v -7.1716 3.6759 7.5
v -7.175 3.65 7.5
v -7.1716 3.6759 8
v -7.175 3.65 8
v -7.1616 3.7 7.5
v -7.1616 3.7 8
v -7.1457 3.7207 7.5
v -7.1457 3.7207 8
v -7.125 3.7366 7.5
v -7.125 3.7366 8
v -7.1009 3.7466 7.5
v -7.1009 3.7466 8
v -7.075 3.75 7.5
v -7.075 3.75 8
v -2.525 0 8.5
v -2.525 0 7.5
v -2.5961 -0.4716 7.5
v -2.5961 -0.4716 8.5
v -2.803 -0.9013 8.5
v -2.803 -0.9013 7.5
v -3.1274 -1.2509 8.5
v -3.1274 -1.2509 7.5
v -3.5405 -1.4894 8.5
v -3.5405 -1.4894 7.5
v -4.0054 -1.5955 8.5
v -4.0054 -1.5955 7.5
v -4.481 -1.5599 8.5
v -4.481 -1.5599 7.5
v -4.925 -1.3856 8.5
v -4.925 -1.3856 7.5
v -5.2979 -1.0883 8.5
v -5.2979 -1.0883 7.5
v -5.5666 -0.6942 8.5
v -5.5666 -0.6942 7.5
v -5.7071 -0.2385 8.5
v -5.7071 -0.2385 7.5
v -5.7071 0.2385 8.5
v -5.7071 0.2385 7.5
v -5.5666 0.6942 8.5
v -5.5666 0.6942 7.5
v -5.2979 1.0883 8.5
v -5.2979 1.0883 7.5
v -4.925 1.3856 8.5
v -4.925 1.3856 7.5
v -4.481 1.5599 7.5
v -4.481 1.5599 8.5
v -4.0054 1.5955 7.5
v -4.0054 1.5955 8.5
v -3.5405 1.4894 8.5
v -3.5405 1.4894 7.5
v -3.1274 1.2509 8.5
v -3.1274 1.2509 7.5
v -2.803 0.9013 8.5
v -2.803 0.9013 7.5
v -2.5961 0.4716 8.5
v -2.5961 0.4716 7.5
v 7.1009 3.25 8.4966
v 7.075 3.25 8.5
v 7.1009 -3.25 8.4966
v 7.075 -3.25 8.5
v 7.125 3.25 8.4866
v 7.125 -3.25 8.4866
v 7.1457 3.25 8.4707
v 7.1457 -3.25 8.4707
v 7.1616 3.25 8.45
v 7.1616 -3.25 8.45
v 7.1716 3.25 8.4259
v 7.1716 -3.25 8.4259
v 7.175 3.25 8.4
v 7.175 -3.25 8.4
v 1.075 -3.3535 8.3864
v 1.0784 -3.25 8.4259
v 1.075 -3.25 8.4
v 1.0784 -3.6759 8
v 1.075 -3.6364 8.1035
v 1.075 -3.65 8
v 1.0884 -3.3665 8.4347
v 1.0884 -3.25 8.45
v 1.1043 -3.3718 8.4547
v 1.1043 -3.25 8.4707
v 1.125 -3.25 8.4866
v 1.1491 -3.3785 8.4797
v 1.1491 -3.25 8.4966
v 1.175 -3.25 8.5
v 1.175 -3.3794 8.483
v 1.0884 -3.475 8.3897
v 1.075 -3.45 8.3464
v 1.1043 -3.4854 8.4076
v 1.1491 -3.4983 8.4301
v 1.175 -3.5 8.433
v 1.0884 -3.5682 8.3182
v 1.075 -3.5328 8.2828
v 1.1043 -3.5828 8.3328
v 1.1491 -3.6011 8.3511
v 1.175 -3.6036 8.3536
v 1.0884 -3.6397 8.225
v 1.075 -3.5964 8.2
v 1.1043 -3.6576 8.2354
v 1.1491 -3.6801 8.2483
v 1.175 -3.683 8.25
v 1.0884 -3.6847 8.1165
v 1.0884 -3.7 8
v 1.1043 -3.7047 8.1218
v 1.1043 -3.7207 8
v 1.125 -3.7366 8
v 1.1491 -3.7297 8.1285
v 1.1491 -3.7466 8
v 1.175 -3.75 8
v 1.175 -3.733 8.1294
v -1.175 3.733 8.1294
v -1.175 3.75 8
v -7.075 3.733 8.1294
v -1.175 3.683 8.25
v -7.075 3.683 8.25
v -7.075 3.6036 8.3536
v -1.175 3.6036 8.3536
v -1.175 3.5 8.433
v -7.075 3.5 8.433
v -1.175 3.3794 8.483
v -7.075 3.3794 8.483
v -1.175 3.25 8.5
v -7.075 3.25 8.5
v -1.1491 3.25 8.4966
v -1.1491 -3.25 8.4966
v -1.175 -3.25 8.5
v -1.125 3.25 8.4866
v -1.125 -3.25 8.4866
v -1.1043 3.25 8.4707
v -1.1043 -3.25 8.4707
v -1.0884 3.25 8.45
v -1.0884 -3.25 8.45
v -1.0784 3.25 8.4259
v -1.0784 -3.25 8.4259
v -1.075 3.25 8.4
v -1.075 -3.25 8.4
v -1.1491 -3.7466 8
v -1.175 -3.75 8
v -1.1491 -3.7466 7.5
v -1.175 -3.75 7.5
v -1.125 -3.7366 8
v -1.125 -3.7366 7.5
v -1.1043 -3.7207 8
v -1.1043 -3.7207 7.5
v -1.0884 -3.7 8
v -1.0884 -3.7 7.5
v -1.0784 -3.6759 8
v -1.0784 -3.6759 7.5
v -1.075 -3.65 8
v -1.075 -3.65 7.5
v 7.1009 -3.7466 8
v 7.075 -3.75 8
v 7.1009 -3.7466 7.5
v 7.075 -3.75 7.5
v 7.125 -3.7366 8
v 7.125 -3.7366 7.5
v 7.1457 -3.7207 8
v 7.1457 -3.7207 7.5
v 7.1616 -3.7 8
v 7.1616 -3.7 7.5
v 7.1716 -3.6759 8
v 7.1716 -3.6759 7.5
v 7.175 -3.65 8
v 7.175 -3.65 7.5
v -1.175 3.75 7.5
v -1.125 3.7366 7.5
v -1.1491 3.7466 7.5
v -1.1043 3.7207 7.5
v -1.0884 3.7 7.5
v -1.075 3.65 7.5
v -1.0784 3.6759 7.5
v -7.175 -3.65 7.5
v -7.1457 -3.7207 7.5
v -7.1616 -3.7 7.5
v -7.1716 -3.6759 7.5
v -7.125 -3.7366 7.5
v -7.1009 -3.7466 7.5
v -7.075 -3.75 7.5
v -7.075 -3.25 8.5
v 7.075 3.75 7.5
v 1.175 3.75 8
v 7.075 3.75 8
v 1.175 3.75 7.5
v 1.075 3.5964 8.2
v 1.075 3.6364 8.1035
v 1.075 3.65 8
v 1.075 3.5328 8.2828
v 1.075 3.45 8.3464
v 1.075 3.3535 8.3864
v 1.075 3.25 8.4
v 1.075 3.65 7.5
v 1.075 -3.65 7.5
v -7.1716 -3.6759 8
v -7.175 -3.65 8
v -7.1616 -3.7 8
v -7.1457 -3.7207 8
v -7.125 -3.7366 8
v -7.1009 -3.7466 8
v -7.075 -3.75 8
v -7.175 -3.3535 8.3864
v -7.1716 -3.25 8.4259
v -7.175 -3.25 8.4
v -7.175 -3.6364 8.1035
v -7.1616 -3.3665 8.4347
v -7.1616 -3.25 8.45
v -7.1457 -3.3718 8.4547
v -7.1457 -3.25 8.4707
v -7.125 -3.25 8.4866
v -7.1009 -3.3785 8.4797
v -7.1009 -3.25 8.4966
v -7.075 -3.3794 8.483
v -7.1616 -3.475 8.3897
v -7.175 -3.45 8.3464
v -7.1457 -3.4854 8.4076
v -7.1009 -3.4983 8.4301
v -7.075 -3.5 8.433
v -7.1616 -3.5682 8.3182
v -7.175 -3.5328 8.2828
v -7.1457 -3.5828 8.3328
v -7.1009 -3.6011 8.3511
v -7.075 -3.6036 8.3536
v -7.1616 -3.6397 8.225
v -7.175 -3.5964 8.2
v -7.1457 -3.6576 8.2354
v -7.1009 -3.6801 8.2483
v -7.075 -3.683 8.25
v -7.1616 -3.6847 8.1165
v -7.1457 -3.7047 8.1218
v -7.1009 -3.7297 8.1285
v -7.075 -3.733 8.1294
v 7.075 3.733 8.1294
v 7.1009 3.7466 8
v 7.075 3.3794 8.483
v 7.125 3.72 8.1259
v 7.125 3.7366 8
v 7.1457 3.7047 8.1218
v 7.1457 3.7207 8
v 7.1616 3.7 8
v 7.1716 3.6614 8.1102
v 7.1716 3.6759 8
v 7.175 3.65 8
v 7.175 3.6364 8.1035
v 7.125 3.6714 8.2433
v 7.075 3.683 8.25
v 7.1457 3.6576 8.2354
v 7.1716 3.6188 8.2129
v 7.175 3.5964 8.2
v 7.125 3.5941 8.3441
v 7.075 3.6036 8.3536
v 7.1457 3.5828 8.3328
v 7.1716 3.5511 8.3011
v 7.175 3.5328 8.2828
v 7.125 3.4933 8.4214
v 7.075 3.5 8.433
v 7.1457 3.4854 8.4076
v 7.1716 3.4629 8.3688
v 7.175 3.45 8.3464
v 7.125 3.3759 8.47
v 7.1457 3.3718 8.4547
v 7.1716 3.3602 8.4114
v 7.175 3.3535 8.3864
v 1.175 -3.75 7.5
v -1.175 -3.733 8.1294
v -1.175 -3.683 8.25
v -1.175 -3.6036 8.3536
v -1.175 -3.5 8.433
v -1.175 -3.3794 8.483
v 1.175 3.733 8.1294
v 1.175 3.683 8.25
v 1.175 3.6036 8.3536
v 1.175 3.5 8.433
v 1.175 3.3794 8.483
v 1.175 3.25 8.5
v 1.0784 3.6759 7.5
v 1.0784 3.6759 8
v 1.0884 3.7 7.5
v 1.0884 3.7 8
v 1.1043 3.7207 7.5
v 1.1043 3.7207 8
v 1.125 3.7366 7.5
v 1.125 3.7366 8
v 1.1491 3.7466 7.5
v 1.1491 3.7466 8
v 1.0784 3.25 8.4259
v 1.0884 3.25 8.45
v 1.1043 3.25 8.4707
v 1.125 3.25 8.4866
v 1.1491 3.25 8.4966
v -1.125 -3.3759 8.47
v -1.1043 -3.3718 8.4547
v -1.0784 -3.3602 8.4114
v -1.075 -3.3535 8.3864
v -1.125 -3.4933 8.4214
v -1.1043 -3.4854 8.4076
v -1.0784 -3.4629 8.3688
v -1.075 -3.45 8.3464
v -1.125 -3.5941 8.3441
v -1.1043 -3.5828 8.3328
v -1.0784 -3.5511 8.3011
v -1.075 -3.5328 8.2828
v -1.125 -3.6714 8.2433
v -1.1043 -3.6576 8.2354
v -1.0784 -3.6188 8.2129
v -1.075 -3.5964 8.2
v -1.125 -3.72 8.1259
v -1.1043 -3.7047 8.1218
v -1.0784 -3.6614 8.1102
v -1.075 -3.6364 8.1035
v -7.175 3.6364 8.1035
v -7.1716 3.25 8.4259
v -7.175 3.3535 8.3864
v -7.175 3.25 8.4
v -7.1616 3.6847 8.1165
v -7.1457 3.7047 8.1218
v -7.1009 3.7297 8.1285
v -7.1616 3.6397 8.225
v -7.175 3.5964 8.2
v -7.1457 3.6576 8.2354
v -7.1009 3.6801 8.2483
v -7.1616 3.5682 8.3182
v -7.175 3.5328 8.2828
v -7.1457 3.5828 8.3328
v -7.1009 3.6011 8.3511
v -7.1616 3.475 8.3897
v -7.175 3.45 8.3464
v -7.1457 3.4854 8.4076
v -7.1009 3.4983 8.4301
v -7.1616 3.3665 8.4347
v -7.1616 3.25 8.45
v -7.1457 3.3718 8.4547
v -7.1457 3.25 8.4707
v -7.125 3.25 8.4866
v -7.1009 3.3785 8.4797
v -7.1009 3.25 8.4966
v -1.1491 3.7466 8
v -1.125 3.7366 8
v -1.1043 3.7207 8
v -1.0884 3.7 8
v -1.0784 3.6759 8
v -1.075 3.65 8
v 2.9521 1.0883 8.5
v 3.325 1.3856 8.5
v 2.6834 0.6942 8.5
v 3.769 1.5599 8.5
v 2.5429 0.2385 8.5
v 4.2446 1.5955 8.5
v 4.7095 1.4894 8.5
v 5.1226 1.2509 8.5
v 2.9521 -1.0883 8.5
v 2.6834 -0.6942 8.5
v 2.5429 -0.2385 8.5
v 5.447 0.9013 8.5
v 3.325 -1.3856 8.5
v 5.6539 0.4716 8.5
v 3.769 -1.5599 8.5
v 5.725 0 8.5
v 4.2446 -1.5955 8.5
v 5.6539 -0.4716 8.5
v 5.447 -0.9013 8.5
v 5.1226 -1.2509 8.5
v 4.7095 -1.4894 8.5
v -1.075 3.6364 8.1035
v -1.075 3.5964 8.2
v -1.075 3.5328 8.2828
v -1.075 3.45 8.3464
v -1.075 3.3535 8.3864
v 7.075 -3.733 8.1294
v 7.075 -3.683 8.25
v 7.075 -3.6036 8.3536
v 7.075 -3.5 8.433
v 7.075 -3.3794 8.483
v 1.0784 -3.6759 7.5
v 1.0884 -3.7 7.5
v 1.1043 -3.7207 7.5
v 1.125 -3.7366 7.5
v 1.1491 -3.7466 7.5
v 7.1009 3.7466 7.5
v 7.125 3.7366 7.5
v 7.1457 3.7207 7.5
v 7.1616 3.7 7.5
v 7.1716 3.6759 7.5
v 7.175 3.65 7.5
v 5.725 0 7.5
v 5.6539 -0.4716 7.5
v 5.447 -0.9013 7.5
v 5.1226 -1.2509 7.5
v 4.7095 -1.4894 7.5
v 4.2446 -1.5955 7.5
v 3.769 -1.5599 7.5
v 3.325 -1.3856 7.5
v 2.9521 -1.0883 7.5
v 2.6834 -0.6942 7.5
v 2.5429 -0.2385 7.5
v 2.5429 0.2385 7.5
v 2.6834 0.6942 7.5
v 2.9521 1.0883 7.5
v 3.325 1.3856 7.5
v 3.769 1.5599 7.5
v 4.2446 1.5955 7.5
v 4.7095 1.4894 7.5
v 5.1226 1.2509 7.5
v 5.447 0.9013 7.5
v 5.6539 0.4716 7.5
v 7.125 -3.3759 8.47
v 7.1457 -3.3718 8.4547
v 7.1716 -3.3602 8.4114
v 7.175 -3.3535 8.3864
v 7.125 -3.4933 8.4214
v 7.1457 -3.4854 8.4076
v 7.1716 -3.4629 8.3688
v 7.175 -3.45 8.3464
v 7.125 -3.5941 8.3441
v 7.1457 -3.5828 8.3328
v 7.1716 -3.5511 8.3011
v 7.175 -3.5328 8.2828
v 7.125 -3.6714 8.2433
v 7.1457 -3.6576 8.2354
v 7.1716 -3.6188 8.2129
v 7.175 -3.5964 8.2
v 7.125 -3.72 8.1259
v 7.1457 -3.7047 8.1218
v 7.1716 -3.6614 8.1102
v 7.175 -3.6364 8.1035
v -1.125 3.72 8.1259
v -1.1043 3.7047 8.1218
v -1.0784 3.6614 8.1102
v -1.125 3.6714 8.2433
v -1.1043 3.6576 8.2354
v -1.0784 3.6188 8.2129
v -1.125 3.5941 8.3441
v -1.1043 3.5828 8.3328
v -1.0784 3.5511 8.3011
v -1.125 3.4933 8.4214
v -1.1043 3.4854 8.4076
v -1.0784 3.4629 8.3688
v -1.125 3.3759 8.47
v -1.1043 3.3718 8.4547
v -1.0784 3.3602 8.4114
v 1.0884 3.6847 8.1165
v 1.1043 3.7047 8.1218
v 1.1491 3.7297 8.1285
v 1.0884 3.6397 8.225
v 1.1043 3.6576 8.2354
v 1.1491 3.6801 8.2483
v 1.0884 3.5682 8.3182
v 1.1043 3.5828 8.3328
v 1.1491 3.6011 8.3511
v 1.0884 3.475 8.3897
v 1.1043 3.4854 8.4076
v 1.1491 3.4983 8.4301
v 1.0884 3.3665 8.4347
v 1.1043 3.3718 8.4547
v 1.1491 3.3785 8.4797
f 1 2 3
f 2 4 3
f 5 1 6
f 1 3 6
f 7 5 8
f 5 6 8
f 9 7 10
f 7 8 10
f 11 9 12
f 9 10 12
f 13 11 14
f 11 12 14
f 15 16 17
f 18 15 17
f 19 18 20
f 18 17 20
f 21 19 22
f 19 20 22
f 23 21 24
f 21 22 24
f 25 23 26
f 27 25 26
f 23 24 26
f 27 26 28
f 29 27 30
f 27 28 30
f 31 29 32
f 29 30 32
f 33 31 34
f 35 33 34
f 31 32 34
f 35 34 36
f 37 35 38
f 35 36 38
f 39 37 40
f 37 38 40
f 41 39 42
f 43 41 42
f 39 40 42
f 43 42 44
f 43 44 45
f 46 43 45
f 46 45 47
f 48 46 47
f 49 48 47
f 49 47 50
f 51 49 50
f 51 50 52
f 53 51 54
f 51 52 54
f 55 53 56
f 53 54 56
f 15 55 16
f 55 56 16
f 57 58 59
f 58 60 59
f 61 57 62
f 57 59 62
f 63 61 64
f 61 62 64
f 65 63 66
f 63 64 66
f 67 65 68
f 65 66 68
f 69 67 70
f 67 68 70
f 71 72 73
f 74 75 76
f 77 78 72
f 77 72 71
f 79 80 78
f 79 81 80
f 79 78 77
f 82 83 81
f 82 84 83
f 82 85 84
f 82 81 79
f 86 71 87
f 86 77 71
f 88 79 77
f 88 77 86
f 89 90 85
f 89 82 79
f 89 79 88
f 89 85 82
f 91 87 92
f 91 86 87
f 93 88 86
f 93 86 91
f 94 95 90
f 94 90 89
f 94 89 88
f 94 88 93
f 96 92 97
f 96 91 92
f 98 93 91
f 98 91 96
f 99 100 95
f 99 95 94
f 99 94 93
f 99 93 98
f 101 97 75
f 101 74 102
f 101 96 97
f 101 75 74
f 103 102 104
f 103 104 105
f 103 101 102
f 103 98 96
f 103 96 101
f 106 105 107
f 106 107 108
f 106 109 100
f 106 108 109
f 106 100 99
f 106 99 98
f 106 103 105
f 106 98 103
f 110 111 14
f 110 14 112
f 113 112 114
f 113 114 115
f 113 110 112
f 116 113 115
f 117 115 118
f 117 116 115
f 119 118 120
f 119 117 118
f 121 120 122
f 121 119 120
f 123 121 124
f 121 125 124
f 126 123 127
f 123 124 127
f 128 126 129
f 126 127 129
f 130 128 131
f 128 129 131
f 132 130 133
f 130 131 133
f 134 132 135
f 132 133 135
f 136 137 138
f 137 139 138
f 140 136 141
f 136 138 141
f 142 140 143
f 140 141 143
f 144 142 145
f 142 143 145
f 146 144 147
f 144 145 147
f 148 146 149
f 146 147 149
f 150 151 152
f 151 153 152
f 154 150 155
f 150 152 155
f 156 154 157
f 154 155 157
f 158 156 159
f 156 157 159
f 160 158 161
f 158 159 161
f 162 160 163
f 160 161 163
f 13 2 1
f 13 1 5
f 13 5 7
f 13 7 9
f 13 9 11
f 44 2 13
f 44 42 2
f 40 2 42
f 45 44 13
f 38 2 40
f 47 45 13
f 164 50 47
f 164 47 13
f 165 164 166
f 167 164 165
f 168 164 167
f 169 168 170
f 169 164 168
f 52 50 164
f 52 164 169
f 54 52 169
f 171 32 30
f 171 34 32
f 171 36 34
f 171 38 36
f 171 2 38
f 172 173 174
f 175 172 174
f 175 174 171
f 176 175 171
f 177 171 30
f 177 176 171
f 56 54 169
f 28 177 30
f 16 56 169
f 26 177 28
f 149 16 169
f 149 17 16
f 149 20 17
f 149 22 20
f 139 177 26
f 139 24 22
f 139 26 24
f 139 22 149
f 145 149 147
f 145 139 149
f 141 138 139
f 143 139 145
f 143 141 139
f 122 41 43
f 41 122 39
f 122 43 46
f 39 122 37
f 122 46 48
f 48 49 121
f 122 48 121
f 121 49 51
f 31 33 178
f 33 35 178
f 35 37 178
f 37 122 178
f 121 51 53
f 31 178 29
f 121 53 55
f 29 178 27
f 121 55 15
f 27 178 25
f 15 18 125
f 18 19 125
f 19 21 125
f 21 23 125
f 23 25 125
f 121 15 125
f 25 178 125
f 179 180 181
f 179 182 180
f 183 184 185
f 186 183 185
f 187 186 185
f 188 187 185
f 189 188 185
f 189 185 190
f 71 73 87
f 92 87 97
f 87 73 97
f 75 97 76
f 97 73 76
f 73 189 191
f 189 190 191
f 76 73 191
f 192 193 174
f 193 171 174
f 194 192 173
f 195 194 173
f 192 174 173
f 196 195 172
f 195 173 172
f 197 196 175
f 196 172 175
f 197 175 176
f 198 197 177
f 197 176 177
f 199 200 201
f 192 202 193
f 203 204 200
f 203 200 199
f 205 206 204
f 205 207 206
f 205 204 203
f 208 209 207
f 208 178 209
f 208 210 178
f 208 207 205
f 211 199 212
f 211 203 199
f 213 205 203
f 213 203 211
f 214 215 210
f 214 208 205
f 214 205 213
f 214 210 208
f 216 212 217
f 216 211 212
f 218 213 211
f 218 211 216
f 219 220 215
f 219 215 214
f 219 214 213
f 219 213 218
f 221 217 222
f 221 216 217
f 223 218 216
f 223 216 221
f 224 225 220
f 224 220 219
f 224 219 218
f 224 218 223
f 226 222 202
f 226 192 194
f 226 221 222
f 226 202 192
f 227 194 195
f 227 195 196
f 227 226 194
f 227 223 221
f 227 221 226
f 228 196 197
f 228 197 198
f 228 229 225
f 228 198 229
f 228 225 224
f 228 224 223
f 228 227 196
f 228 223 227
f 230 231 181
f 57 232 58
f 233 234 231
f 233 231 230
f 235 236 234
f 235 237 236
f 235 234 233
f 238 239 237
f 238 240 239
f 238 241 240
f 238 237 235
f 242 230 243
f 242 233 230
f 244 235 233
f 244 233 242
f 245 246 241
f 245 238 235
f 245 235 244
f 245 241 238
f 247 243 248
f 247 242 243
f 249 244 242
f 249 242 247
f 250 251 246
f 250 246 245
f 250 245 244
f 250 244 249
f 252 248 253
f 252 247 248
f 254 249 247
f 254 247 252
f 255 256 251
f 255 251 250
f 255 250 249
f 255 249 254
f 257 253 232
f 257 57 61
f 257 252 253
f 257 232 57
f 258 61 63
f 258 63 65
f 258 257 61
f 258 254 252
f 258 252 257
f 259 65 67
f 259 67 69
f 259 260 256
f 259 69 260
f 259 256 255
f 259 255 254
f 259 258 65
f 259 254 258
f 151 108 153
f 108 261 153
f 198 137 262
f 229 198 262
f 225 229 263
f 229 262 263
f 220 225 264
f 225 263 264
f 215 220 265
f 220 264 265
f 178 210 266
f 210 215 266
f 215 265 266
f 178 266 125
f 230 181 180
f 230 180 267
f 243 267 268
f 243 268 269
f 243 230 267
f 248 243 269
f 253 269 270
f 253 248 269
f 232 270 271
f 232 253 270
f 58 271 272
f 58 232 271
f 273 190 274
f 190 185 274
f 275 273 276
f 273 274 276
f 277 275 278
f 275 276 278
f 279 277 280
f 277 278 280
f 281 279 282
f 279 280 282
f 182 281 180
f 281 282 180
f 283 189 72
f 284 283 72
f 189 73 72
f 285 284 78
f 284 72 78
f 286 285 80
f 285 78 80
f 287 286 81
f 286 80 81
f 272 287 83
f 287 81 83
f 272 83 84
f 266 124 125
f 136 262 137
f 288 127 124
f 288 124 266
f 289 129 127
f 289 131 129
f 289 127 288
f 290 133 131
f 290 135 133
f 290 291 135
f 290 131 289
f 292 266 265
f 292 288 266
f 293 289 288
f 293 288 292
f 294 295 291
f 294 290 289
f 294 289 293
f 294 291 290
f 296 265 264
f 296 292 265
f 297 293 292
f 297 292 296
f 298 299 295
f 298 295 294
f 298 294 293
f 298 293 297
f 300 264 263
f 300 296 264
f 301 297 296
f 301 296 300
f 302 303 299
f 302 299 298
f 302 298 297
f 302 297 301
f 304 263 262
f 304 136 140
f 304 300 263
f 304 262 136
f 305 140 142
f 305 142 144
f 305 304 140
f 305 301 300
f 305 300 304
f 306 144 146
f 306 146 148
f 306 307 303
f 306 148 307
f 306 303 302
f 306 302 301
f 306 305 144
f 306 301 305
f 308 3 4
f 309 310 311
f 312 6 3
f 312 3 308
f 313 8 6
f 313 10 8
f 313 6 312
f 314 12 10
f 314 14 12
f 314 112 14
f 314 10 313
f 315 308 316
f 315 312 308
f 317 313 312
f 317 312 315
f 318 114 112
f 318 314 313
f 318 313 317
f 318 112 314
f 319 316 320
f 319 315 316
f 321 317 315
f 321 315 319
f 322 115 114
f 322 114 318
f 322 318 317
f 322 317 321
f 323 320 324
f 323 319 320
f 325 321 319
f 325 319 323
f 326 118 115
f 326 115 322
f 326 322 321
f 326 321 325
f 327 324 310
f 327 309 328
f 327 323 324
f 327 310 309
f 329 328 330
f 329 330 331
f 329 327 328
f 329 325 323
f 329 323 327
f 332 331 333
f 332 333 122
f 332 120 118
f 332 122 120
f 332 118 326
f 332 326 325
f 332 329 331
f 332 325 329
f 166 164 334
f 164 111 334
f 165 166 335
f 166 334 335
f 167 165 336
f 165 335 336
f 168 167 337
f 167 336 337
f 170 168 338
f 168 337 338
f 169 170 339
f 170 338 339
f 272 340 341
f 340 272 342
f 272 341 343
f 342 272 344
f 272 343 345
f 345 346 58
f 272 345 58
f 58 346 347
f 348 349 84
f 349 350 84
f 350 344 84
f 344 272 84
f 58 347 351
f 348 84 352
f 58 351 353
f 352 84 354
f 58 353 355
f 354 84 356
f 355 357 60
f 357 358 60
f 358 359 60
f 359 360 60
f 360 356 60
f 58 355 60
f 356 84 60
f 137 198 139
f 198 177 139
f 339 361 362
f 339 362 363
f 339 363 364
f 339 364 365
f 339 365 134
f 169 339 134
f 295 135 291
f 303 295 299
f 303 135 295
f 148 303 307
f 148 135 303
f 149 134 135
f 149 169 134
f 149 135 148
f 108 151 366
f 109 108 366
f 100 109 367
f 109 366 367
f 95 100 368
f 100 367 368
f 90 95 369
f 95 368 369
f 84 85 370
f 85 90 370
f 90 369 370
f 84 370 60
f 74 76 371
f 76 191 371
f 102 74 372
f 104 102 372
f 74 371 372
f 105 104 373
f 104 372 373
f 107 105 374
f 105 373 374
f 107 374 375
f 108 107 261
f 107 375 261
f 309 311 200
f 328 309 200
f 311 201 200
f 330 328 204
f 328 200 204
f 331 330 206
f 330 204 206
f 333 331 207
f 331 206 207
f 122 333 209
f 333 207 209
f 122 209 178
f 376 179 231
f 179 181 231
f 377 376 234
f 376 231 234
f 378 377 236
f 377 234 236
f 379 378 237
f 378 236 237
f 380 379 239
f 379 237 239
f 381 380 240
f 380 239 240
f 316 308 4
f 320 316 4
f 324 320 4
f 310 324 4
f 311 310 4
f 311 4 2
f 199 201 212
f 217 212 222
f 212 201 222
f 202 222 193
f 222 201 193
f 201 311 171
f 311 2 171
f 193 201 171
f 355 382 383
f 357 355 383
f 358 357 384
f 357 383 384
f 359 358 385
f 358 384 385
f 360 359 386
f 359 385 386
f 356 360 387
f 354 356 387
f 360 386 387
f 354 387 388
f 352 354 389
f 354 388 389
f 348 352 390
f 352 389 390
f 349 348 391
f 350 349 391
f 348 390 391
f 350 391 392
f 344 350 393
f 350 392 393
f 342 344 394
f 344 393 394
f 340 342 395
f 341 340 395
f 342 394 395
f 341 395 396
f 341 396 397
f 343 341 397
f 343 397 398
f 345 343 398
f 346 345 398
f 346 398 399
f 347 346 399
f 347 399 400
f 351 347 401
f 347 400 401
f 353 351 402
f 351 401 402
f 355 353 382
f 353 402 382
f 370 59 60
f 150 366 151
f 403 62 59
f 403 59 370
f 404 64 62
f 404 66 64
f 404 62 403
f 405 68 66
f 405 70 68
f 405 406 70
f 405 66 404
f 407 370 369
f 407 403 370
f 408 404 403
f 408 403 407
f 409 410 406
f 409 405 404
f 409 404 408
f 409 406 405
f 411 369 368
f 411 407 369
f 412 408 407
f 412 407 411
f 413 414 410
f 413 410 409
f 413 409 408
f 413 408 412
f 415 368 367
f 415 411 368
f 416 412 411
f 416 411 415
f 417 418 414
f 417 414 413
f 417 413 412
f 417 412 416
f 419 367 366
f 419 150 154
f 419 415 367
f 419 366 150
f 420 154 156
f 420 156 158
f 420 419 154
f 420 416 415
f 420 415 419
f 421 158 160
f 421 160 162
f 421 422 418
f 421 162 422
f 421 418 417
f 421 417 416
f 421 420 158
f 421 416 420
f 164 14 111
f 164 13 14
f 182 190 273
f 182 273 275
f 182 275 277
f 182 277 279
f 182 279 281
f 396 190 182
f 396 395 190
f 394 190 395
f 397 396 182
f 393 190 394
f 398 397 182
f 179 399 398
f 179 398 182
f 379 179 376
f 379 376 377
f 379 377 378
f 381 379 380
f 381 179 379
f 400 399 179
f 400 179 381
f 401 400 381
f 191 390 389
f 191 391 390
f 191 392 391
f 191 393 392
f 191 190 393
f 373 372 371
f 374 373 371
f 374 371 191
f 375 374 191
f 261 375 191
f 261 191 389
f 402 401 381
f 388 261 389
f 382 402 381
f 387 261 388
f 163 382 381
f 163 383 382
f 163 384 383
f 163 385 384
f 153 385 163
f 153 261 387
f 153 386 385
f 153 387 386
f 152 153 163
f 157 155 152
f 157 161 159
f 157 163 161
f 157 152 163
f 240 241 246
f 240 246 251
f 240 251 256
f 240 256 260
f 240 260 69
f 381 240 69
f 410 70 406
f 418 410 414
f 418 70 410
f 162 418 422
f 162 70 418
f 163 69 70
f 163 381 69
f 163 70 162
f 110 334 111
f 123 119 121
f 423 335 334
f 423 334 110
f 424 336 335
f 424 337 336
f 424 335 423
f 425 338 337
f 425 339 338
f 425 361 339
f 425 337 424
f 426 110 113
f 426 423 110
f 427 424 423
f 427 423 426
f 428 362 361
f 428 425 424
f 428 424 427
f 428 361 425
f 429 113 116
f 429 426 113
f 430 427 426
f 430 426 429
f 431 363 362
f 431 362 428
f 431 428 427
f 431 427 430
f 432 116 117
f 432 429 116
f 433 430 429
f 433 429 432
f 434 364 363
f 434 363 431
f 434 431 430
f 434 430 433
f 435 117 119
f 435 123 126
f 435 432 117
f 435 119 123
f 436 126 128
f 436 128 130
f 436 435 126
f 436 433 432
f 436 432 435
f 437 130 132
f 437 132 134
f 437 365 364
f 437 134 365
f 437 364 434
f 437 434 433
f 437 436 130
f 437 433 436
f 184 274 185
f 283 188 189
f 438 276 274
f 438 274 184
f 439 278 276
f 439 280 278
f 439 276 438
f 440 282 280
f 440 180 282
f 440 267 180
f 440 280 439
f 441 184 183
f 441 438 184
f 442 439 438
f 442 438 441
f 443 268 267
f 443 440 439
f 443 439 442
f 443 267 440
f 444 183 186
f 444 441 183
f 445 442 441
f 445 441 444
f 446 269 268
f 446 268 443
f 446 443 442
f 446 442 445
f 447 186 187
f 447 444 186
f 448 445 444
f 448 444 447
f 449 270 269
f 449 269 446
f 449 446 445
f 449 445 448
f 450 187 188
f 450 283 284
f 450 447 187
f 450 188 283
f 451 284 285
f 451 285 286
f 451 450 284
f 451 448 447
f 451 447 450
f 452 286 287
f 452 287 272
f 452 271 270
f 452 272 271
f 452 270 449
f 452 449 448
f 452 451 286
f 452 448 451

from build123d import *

# Parameters (mm, degrees)
SKETCH010_W  = 6.1
SKETCH010_H  = 7.5
SKETCH010_R  = 1.6
PAD002_DEPTH = 1
FILLET_R     = 0.5
FILLET001_R  = 0.1


with BuildPart() as part:
    # Sketch010 → Pad002 (new body)
    with BuildSketch(Plane(origin=(0, 0, 7.5), x_dir=(1, 0, 0), z_dir=(0, 0, -1))):
        with Locations((-4.125, 0)):
            Rectangle(SKETCH010_W, SKETCH010_H)
        with Locations((-4.125, 0)):
            Circle(SKETCH010_R, mode=Mode.SUBTRACT)
        with Locations((4.125, 0)):
            Rectangle(SKETCH010_W, SKETCH010_H)
        with Locations((4.125, 0)):
            Circle(SKETCH010_R, mode=Mode.SUBTRACT)
    extrude(amount=-PAD002_DEPTH)

    # Fillet
    fillet_edges = [part.edges().sort_by_distance(p)[0] for p in [
        (-4.125, -3.75, 8.5),
        (-4.125, 3.75, 8.5),
        (4.125, -3.75, 8.5),
        (4.125, 3.75, 8.5),
    ]]
    fillet(fillet_edges, radius=FILLET_R)

    # Fillet001
    fillet001_edges = [part.edges().sort_by_distance(p)[0] for p in [
        (-7.175, 0, 8.5),
        (-1.075, 0, 8.5),
        (1.075, 0, 8.5),
        (7.175, 0, 8.5),
    ]]
    fillet(fillet001_edges, radius=FILLET001_R)


solid = part.part
